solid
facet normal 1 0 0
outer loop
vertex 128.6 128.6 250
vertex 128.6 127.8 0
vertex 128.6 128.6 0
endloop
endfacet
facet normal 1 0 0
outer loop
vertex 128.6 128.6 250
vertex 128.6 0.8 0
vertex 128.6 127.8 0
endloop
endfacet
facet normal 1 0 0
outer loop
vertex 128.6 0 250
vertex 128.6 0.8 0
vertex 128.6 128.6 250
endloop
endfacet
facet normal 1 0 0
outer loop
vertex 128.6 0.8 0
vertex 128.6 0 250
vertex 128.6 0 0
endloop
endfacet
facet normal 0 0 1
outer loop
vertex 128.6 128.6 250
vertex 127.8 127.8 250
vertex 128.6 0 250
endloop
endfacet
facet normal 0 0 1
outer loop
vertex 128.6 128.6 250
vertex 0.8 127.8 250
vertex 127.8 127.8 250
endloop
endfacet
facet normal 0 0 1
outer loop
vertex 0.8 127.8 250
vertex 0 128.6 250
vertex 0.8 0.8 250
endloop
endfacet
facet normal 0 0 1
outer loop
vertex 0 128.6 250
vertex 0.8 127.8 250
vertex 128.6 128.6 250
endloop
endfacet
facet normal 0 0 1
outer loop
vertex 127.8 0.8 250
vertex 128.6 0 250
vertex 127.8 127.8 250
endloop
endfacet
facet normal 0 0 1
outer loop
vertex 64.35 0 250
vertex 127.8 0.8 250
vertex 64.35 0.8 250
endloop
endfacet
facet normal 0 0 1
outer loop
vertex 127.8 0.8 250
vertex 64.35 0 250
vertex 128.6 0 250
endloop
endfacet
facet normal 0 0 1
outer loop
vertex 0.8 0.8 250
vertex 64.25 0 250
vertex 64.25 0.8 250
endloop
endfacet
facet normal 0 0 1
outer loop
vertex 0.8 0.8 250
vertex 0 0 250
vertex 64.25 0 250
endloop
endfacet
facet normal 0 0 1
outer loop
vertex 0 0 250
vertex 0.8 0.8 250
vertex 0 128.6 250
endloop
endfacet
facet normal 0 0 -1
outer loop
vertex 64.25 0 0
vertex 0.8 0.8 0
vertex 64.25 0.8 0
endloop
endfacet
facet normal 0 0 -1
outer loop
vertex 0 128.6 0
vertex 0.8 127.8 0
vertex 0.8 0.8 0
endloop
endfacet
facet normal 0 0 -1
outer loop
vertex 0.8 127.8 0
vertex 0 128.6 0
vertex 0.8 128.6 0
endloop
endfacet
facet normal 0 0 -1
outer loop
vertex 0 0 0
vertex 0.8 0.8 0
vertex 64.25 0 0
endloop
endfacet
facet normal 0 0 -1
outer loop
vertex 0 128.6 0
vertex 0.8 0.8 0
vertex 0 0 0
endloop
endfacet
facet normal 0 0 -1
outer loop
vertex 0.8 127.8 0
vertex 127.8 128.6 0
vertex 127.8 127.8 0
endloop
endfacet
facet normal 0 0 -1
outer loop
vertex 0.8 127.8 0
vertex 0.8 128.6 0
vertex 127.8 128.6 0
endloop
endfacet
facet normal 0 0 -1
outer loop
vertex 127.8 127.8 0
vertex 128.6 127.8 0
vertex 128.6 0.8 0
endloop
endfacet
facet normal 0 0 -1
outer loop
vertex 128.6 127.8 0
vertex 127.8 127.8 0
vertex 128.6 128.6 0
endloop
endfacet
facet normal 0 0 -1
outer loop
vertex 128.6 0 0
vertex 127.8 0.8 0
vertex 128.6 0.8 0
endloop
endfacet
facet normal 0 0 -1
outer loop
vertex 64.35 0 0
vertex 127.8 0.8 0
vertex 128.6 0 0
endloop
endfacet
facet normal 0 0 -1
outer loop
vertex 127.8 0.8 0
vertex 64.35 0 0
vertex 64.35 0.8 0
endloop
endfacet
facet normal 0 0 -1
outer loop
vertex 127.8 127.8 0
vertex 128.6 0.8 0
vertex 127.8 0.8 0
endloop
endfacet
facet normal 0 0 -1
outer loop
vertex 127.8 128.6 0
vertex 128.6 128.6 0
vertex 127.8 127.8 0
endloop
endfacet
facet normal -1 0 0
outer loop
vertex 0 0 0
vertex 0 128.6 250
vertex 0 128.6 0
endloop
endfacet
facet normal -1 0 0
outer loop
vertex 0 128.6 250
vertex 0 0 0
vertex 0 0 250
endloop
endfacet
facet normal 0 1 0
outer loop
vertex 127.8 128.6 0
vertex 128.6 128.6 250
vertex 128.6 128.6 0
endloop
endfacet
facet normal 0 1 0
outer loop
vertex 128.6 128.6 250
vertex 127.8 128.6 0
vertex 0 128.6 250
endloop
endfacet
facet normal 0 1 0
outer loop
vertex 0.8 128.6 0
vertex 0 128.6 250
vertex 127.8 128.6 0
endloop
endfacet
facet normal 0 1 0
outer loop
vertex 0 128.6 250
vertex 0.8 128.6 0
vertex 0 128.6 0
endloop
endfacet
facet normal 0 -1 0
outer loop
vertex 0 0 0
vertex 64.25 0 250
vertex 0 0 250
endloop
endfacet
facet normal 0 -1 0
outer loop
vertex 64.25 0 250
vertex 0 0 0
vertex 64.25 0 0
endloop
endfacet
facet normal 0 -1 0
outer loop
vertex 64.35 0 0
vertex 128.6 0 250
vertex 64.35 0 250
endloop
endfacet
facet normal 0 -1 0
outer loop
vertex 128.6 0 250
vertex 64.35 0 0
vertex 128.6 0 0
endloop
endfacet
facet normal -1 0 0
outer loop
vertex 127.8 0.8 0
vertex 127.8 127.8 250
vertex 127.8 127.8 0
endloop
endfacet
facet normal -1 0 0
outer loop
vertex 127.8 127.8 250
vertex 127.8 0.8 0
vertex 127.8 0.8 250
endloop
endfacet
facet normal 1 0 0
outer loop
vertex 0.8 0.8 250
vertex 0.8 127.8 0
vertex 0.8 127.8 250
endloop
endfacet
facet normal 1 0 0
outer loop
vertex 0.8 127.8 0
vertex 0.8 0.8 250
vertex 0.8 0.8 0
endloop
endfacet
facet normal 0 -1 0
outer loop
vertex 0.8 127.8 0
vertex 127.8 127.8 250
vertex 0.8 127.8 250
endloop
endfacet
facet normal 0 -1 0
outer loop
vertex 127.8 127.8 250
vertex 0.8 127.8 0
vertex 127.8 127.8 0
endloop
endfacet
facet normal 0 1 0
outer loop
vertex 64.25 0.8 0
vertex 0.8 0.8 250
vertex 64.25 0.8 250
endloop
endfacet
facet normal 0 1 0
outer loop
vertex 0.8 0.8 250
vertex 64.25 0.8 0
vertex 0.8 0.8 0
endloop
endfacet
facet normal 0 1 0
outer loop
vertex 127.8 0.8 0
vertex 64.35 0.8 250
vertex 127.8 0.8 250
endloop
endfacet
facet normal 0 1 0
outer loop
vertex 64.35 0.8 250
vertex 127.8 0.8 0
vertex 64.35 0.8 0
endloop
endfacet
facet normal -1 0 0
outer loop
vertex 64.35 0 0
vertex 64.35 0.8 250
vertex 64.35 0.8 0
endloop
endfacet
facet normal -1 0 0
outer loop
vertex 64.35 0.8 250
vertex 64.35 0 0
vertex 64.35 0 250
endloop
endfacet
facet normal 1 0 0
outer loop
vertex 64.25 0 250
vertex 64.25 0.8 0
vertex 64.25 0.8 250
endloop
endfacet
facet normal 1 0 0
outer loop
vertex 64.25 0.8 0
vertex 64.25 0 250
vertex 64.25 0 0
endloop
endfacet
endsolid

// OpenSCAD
// =============================================
// 3D: Ventilation cover (square tube with back slit)
// Версия: v1.0 — initial model: 127x127 inner, h=250, wall=0.8, back slit
// =============================================

// Short description for models table
description = "Ventilation cover: square tube 127x127x250, wall 0.8, back slit";

use <../modules.scad>;

// ===== Точность аппроксимации окружностей =====
$fn = 0;        // фиксированную сегментацию отключаем
$fa = 6;        // 5–8° обычно достаточно
$fs = 0.35;     // ≈ диаметр сопла (0.3–0.5 для сопла 0.4)
pin_fs = 0.25;  // чуть тоньше для штырей и отверстий

// ===== Режим печати тест‑фрагментов =====
test_fragment = false;   // true — печатать только угловой фрагмент
frag_size     = 200;      // размер квадрата вырезки, мм
frag_index    = 0;       // 0=НЛ, 1=ВЛ, 2=НП, 3=ВП (относительно основания)
frag_gap_x    = 10;      // зазор между фрагментами по X, мм (не используется в этой модели)
frag_h_extra  = -110;      // запас по высоте клипа, мм

// ===== Общие доп. параметры =====
tiny = 0.1;              // небольшой зазор для булевых операций
edge_chamfer_z = 1;      // высота фаски по Z (мм)
edge_chamfer_x = 5;      // горизонтальный вылет фаски по X (с каждой стороны), мм
edge_chamfer_y = 5;      // горизонтальный вылет фаски по Y (с каждой стороны), мм
screen_frame_gap = 0.2;  // только для высоты вычитаний (не влияет на XY)

// ===== Параметры модели =====
inner_x_mm = 127;        // внутренний размер по X, мм
inner_y_mm = 127;        // внутренний размер по Y, мм
cover_h_mm = 250;        // высота по Z, мм
wall_th_mm = 0.8;        // толщина стенок, мм

back_slit_enable = true; // разрез задней стенки по центру
back_slit_gap_mm = 0.1;  // ширина разреза, мм

// ===== Вычисляемые размеры =====
outer_x_mm = inner_x_mm + 2 * wall_th_mm;
outer_y_mm = inner_y_mm + 2 * wall_th_mm;

// ===== Комментарии ===========================
/*
Модель: вентиляционный кожух (тонкостенная квадратная труба) без крышек сверху/снизу.

Фрагменты:
- base: основная деталь (4 стенки) с разрезом на задней стенке

План:
- Делается оболочка как разность outer_box - inner_box.
- Разрез задней стенки: щель шириной back_slit_gap_mm по центру X, только в зоне задней стенки (Y≈0..wall_th).
- По нижней кромке можно включить фаску через edge_chamfer_* (значения автоматически ограничиваются толщиной стенки).
*/

// ===== Вспомогательные функции ====================
function clamp01(v) = clamp(v, 0, 1);

// ===== Вспомогательные модули ====================
// Wedge along X: triangle in (Y,Z), extruded along X
module wedge_along_x(len_x, depth_y, height_z) {
  rotate([0, 90, 0])
    linear_extrude(height=len_x)
      polygon(points=[
        [0, 0],          // z=0, y=0
        [0, depth_y],    // z=0, y=depth
        [height_z, 0]    // z=height, y=0
      ]);
}

// Wedge along Y: triangle in (X,Z), extruded along Y
module wedge_along_y(len_y, depth_x, height_z) {
  rotate([-90, 0, 0])
    linear_extrude(height=len_y)
      polygon(points=[
        [0, 0],          // x=0, z=0
        [depth_x, 0],    // x=depth, z=0
        [0, height_z]    // x=0, z=height
      ]);
}

// ===== Модули деталей ====================
module base_shell() {
  difference() {
    cube([outer_x_mm, outer_y_mm, cover_h_mm], center=false);
    translate([wall_th_mm, wall_th_mm, -tiny])
      cube([inner_x_mm, inner_y_mm, cover_h_mm + 2*tiny], center=false);
  }
}

module back_slit_cut() {
  if (back_slit_enable) {
    x0 = outer_x_mm/2 - back_slit_gap_mm/2;
    translate([x0, -tiny, -tiny])
      cube([back_slit_gap_mm, wall_th_mm + 2*tiny, cover_h_mm + 2*tiny], center=false);
  }
}

module bottom_chamfer_cuts() {
  chz = clamp(edge_chamfer_z, 0, cover_h_mm/2);
  chx = clamp(edge_chamfer_x, 0, wall_th_mm);
  chy = clamp(edge_chamfer_y, 0, wall_th_mm);

  if (chz > 0) {
    union() {
      if (chy > 0) {
        // back + front
        translate([0, 0, 0]) wedge_along_x(outer_x_mm, chy, chz);
        translate([0, outer_y_mm - chy, 0]) wedge_along_x(outer_x_mm, chy, chz);
      }
      if (chx > 0) {
        // left + right
        translate([0, 0, 0]) wedge_along_y(outer_y_mm, chx, chz);
        translate([outer_x_mm - chx, 0, 0]) wedge_along_y(outer_y_mm, chx, chz);
      }
    }
  }
}

// Основная деталь
module base() {
  difference() {
    difference() {
      base_shell();
      back_slit_cut();
    }
    bottom_chamfer_cuts();
  }
}

// ===== Вывод всех фрагментов ====================
module show_all() {
  clip_for_fragments_bbox(
    outer_x_mm,
    outer_y_mm,
    cover_h_mm,
    enabled=test_fragment,
    frag_size=frag_size,
    frag_index=frag_index,
    frag_h_extra=frag_h_extra
  ) base();
}

// ===== Точка входа ====================
module main() {
  show_all();
}

main();
